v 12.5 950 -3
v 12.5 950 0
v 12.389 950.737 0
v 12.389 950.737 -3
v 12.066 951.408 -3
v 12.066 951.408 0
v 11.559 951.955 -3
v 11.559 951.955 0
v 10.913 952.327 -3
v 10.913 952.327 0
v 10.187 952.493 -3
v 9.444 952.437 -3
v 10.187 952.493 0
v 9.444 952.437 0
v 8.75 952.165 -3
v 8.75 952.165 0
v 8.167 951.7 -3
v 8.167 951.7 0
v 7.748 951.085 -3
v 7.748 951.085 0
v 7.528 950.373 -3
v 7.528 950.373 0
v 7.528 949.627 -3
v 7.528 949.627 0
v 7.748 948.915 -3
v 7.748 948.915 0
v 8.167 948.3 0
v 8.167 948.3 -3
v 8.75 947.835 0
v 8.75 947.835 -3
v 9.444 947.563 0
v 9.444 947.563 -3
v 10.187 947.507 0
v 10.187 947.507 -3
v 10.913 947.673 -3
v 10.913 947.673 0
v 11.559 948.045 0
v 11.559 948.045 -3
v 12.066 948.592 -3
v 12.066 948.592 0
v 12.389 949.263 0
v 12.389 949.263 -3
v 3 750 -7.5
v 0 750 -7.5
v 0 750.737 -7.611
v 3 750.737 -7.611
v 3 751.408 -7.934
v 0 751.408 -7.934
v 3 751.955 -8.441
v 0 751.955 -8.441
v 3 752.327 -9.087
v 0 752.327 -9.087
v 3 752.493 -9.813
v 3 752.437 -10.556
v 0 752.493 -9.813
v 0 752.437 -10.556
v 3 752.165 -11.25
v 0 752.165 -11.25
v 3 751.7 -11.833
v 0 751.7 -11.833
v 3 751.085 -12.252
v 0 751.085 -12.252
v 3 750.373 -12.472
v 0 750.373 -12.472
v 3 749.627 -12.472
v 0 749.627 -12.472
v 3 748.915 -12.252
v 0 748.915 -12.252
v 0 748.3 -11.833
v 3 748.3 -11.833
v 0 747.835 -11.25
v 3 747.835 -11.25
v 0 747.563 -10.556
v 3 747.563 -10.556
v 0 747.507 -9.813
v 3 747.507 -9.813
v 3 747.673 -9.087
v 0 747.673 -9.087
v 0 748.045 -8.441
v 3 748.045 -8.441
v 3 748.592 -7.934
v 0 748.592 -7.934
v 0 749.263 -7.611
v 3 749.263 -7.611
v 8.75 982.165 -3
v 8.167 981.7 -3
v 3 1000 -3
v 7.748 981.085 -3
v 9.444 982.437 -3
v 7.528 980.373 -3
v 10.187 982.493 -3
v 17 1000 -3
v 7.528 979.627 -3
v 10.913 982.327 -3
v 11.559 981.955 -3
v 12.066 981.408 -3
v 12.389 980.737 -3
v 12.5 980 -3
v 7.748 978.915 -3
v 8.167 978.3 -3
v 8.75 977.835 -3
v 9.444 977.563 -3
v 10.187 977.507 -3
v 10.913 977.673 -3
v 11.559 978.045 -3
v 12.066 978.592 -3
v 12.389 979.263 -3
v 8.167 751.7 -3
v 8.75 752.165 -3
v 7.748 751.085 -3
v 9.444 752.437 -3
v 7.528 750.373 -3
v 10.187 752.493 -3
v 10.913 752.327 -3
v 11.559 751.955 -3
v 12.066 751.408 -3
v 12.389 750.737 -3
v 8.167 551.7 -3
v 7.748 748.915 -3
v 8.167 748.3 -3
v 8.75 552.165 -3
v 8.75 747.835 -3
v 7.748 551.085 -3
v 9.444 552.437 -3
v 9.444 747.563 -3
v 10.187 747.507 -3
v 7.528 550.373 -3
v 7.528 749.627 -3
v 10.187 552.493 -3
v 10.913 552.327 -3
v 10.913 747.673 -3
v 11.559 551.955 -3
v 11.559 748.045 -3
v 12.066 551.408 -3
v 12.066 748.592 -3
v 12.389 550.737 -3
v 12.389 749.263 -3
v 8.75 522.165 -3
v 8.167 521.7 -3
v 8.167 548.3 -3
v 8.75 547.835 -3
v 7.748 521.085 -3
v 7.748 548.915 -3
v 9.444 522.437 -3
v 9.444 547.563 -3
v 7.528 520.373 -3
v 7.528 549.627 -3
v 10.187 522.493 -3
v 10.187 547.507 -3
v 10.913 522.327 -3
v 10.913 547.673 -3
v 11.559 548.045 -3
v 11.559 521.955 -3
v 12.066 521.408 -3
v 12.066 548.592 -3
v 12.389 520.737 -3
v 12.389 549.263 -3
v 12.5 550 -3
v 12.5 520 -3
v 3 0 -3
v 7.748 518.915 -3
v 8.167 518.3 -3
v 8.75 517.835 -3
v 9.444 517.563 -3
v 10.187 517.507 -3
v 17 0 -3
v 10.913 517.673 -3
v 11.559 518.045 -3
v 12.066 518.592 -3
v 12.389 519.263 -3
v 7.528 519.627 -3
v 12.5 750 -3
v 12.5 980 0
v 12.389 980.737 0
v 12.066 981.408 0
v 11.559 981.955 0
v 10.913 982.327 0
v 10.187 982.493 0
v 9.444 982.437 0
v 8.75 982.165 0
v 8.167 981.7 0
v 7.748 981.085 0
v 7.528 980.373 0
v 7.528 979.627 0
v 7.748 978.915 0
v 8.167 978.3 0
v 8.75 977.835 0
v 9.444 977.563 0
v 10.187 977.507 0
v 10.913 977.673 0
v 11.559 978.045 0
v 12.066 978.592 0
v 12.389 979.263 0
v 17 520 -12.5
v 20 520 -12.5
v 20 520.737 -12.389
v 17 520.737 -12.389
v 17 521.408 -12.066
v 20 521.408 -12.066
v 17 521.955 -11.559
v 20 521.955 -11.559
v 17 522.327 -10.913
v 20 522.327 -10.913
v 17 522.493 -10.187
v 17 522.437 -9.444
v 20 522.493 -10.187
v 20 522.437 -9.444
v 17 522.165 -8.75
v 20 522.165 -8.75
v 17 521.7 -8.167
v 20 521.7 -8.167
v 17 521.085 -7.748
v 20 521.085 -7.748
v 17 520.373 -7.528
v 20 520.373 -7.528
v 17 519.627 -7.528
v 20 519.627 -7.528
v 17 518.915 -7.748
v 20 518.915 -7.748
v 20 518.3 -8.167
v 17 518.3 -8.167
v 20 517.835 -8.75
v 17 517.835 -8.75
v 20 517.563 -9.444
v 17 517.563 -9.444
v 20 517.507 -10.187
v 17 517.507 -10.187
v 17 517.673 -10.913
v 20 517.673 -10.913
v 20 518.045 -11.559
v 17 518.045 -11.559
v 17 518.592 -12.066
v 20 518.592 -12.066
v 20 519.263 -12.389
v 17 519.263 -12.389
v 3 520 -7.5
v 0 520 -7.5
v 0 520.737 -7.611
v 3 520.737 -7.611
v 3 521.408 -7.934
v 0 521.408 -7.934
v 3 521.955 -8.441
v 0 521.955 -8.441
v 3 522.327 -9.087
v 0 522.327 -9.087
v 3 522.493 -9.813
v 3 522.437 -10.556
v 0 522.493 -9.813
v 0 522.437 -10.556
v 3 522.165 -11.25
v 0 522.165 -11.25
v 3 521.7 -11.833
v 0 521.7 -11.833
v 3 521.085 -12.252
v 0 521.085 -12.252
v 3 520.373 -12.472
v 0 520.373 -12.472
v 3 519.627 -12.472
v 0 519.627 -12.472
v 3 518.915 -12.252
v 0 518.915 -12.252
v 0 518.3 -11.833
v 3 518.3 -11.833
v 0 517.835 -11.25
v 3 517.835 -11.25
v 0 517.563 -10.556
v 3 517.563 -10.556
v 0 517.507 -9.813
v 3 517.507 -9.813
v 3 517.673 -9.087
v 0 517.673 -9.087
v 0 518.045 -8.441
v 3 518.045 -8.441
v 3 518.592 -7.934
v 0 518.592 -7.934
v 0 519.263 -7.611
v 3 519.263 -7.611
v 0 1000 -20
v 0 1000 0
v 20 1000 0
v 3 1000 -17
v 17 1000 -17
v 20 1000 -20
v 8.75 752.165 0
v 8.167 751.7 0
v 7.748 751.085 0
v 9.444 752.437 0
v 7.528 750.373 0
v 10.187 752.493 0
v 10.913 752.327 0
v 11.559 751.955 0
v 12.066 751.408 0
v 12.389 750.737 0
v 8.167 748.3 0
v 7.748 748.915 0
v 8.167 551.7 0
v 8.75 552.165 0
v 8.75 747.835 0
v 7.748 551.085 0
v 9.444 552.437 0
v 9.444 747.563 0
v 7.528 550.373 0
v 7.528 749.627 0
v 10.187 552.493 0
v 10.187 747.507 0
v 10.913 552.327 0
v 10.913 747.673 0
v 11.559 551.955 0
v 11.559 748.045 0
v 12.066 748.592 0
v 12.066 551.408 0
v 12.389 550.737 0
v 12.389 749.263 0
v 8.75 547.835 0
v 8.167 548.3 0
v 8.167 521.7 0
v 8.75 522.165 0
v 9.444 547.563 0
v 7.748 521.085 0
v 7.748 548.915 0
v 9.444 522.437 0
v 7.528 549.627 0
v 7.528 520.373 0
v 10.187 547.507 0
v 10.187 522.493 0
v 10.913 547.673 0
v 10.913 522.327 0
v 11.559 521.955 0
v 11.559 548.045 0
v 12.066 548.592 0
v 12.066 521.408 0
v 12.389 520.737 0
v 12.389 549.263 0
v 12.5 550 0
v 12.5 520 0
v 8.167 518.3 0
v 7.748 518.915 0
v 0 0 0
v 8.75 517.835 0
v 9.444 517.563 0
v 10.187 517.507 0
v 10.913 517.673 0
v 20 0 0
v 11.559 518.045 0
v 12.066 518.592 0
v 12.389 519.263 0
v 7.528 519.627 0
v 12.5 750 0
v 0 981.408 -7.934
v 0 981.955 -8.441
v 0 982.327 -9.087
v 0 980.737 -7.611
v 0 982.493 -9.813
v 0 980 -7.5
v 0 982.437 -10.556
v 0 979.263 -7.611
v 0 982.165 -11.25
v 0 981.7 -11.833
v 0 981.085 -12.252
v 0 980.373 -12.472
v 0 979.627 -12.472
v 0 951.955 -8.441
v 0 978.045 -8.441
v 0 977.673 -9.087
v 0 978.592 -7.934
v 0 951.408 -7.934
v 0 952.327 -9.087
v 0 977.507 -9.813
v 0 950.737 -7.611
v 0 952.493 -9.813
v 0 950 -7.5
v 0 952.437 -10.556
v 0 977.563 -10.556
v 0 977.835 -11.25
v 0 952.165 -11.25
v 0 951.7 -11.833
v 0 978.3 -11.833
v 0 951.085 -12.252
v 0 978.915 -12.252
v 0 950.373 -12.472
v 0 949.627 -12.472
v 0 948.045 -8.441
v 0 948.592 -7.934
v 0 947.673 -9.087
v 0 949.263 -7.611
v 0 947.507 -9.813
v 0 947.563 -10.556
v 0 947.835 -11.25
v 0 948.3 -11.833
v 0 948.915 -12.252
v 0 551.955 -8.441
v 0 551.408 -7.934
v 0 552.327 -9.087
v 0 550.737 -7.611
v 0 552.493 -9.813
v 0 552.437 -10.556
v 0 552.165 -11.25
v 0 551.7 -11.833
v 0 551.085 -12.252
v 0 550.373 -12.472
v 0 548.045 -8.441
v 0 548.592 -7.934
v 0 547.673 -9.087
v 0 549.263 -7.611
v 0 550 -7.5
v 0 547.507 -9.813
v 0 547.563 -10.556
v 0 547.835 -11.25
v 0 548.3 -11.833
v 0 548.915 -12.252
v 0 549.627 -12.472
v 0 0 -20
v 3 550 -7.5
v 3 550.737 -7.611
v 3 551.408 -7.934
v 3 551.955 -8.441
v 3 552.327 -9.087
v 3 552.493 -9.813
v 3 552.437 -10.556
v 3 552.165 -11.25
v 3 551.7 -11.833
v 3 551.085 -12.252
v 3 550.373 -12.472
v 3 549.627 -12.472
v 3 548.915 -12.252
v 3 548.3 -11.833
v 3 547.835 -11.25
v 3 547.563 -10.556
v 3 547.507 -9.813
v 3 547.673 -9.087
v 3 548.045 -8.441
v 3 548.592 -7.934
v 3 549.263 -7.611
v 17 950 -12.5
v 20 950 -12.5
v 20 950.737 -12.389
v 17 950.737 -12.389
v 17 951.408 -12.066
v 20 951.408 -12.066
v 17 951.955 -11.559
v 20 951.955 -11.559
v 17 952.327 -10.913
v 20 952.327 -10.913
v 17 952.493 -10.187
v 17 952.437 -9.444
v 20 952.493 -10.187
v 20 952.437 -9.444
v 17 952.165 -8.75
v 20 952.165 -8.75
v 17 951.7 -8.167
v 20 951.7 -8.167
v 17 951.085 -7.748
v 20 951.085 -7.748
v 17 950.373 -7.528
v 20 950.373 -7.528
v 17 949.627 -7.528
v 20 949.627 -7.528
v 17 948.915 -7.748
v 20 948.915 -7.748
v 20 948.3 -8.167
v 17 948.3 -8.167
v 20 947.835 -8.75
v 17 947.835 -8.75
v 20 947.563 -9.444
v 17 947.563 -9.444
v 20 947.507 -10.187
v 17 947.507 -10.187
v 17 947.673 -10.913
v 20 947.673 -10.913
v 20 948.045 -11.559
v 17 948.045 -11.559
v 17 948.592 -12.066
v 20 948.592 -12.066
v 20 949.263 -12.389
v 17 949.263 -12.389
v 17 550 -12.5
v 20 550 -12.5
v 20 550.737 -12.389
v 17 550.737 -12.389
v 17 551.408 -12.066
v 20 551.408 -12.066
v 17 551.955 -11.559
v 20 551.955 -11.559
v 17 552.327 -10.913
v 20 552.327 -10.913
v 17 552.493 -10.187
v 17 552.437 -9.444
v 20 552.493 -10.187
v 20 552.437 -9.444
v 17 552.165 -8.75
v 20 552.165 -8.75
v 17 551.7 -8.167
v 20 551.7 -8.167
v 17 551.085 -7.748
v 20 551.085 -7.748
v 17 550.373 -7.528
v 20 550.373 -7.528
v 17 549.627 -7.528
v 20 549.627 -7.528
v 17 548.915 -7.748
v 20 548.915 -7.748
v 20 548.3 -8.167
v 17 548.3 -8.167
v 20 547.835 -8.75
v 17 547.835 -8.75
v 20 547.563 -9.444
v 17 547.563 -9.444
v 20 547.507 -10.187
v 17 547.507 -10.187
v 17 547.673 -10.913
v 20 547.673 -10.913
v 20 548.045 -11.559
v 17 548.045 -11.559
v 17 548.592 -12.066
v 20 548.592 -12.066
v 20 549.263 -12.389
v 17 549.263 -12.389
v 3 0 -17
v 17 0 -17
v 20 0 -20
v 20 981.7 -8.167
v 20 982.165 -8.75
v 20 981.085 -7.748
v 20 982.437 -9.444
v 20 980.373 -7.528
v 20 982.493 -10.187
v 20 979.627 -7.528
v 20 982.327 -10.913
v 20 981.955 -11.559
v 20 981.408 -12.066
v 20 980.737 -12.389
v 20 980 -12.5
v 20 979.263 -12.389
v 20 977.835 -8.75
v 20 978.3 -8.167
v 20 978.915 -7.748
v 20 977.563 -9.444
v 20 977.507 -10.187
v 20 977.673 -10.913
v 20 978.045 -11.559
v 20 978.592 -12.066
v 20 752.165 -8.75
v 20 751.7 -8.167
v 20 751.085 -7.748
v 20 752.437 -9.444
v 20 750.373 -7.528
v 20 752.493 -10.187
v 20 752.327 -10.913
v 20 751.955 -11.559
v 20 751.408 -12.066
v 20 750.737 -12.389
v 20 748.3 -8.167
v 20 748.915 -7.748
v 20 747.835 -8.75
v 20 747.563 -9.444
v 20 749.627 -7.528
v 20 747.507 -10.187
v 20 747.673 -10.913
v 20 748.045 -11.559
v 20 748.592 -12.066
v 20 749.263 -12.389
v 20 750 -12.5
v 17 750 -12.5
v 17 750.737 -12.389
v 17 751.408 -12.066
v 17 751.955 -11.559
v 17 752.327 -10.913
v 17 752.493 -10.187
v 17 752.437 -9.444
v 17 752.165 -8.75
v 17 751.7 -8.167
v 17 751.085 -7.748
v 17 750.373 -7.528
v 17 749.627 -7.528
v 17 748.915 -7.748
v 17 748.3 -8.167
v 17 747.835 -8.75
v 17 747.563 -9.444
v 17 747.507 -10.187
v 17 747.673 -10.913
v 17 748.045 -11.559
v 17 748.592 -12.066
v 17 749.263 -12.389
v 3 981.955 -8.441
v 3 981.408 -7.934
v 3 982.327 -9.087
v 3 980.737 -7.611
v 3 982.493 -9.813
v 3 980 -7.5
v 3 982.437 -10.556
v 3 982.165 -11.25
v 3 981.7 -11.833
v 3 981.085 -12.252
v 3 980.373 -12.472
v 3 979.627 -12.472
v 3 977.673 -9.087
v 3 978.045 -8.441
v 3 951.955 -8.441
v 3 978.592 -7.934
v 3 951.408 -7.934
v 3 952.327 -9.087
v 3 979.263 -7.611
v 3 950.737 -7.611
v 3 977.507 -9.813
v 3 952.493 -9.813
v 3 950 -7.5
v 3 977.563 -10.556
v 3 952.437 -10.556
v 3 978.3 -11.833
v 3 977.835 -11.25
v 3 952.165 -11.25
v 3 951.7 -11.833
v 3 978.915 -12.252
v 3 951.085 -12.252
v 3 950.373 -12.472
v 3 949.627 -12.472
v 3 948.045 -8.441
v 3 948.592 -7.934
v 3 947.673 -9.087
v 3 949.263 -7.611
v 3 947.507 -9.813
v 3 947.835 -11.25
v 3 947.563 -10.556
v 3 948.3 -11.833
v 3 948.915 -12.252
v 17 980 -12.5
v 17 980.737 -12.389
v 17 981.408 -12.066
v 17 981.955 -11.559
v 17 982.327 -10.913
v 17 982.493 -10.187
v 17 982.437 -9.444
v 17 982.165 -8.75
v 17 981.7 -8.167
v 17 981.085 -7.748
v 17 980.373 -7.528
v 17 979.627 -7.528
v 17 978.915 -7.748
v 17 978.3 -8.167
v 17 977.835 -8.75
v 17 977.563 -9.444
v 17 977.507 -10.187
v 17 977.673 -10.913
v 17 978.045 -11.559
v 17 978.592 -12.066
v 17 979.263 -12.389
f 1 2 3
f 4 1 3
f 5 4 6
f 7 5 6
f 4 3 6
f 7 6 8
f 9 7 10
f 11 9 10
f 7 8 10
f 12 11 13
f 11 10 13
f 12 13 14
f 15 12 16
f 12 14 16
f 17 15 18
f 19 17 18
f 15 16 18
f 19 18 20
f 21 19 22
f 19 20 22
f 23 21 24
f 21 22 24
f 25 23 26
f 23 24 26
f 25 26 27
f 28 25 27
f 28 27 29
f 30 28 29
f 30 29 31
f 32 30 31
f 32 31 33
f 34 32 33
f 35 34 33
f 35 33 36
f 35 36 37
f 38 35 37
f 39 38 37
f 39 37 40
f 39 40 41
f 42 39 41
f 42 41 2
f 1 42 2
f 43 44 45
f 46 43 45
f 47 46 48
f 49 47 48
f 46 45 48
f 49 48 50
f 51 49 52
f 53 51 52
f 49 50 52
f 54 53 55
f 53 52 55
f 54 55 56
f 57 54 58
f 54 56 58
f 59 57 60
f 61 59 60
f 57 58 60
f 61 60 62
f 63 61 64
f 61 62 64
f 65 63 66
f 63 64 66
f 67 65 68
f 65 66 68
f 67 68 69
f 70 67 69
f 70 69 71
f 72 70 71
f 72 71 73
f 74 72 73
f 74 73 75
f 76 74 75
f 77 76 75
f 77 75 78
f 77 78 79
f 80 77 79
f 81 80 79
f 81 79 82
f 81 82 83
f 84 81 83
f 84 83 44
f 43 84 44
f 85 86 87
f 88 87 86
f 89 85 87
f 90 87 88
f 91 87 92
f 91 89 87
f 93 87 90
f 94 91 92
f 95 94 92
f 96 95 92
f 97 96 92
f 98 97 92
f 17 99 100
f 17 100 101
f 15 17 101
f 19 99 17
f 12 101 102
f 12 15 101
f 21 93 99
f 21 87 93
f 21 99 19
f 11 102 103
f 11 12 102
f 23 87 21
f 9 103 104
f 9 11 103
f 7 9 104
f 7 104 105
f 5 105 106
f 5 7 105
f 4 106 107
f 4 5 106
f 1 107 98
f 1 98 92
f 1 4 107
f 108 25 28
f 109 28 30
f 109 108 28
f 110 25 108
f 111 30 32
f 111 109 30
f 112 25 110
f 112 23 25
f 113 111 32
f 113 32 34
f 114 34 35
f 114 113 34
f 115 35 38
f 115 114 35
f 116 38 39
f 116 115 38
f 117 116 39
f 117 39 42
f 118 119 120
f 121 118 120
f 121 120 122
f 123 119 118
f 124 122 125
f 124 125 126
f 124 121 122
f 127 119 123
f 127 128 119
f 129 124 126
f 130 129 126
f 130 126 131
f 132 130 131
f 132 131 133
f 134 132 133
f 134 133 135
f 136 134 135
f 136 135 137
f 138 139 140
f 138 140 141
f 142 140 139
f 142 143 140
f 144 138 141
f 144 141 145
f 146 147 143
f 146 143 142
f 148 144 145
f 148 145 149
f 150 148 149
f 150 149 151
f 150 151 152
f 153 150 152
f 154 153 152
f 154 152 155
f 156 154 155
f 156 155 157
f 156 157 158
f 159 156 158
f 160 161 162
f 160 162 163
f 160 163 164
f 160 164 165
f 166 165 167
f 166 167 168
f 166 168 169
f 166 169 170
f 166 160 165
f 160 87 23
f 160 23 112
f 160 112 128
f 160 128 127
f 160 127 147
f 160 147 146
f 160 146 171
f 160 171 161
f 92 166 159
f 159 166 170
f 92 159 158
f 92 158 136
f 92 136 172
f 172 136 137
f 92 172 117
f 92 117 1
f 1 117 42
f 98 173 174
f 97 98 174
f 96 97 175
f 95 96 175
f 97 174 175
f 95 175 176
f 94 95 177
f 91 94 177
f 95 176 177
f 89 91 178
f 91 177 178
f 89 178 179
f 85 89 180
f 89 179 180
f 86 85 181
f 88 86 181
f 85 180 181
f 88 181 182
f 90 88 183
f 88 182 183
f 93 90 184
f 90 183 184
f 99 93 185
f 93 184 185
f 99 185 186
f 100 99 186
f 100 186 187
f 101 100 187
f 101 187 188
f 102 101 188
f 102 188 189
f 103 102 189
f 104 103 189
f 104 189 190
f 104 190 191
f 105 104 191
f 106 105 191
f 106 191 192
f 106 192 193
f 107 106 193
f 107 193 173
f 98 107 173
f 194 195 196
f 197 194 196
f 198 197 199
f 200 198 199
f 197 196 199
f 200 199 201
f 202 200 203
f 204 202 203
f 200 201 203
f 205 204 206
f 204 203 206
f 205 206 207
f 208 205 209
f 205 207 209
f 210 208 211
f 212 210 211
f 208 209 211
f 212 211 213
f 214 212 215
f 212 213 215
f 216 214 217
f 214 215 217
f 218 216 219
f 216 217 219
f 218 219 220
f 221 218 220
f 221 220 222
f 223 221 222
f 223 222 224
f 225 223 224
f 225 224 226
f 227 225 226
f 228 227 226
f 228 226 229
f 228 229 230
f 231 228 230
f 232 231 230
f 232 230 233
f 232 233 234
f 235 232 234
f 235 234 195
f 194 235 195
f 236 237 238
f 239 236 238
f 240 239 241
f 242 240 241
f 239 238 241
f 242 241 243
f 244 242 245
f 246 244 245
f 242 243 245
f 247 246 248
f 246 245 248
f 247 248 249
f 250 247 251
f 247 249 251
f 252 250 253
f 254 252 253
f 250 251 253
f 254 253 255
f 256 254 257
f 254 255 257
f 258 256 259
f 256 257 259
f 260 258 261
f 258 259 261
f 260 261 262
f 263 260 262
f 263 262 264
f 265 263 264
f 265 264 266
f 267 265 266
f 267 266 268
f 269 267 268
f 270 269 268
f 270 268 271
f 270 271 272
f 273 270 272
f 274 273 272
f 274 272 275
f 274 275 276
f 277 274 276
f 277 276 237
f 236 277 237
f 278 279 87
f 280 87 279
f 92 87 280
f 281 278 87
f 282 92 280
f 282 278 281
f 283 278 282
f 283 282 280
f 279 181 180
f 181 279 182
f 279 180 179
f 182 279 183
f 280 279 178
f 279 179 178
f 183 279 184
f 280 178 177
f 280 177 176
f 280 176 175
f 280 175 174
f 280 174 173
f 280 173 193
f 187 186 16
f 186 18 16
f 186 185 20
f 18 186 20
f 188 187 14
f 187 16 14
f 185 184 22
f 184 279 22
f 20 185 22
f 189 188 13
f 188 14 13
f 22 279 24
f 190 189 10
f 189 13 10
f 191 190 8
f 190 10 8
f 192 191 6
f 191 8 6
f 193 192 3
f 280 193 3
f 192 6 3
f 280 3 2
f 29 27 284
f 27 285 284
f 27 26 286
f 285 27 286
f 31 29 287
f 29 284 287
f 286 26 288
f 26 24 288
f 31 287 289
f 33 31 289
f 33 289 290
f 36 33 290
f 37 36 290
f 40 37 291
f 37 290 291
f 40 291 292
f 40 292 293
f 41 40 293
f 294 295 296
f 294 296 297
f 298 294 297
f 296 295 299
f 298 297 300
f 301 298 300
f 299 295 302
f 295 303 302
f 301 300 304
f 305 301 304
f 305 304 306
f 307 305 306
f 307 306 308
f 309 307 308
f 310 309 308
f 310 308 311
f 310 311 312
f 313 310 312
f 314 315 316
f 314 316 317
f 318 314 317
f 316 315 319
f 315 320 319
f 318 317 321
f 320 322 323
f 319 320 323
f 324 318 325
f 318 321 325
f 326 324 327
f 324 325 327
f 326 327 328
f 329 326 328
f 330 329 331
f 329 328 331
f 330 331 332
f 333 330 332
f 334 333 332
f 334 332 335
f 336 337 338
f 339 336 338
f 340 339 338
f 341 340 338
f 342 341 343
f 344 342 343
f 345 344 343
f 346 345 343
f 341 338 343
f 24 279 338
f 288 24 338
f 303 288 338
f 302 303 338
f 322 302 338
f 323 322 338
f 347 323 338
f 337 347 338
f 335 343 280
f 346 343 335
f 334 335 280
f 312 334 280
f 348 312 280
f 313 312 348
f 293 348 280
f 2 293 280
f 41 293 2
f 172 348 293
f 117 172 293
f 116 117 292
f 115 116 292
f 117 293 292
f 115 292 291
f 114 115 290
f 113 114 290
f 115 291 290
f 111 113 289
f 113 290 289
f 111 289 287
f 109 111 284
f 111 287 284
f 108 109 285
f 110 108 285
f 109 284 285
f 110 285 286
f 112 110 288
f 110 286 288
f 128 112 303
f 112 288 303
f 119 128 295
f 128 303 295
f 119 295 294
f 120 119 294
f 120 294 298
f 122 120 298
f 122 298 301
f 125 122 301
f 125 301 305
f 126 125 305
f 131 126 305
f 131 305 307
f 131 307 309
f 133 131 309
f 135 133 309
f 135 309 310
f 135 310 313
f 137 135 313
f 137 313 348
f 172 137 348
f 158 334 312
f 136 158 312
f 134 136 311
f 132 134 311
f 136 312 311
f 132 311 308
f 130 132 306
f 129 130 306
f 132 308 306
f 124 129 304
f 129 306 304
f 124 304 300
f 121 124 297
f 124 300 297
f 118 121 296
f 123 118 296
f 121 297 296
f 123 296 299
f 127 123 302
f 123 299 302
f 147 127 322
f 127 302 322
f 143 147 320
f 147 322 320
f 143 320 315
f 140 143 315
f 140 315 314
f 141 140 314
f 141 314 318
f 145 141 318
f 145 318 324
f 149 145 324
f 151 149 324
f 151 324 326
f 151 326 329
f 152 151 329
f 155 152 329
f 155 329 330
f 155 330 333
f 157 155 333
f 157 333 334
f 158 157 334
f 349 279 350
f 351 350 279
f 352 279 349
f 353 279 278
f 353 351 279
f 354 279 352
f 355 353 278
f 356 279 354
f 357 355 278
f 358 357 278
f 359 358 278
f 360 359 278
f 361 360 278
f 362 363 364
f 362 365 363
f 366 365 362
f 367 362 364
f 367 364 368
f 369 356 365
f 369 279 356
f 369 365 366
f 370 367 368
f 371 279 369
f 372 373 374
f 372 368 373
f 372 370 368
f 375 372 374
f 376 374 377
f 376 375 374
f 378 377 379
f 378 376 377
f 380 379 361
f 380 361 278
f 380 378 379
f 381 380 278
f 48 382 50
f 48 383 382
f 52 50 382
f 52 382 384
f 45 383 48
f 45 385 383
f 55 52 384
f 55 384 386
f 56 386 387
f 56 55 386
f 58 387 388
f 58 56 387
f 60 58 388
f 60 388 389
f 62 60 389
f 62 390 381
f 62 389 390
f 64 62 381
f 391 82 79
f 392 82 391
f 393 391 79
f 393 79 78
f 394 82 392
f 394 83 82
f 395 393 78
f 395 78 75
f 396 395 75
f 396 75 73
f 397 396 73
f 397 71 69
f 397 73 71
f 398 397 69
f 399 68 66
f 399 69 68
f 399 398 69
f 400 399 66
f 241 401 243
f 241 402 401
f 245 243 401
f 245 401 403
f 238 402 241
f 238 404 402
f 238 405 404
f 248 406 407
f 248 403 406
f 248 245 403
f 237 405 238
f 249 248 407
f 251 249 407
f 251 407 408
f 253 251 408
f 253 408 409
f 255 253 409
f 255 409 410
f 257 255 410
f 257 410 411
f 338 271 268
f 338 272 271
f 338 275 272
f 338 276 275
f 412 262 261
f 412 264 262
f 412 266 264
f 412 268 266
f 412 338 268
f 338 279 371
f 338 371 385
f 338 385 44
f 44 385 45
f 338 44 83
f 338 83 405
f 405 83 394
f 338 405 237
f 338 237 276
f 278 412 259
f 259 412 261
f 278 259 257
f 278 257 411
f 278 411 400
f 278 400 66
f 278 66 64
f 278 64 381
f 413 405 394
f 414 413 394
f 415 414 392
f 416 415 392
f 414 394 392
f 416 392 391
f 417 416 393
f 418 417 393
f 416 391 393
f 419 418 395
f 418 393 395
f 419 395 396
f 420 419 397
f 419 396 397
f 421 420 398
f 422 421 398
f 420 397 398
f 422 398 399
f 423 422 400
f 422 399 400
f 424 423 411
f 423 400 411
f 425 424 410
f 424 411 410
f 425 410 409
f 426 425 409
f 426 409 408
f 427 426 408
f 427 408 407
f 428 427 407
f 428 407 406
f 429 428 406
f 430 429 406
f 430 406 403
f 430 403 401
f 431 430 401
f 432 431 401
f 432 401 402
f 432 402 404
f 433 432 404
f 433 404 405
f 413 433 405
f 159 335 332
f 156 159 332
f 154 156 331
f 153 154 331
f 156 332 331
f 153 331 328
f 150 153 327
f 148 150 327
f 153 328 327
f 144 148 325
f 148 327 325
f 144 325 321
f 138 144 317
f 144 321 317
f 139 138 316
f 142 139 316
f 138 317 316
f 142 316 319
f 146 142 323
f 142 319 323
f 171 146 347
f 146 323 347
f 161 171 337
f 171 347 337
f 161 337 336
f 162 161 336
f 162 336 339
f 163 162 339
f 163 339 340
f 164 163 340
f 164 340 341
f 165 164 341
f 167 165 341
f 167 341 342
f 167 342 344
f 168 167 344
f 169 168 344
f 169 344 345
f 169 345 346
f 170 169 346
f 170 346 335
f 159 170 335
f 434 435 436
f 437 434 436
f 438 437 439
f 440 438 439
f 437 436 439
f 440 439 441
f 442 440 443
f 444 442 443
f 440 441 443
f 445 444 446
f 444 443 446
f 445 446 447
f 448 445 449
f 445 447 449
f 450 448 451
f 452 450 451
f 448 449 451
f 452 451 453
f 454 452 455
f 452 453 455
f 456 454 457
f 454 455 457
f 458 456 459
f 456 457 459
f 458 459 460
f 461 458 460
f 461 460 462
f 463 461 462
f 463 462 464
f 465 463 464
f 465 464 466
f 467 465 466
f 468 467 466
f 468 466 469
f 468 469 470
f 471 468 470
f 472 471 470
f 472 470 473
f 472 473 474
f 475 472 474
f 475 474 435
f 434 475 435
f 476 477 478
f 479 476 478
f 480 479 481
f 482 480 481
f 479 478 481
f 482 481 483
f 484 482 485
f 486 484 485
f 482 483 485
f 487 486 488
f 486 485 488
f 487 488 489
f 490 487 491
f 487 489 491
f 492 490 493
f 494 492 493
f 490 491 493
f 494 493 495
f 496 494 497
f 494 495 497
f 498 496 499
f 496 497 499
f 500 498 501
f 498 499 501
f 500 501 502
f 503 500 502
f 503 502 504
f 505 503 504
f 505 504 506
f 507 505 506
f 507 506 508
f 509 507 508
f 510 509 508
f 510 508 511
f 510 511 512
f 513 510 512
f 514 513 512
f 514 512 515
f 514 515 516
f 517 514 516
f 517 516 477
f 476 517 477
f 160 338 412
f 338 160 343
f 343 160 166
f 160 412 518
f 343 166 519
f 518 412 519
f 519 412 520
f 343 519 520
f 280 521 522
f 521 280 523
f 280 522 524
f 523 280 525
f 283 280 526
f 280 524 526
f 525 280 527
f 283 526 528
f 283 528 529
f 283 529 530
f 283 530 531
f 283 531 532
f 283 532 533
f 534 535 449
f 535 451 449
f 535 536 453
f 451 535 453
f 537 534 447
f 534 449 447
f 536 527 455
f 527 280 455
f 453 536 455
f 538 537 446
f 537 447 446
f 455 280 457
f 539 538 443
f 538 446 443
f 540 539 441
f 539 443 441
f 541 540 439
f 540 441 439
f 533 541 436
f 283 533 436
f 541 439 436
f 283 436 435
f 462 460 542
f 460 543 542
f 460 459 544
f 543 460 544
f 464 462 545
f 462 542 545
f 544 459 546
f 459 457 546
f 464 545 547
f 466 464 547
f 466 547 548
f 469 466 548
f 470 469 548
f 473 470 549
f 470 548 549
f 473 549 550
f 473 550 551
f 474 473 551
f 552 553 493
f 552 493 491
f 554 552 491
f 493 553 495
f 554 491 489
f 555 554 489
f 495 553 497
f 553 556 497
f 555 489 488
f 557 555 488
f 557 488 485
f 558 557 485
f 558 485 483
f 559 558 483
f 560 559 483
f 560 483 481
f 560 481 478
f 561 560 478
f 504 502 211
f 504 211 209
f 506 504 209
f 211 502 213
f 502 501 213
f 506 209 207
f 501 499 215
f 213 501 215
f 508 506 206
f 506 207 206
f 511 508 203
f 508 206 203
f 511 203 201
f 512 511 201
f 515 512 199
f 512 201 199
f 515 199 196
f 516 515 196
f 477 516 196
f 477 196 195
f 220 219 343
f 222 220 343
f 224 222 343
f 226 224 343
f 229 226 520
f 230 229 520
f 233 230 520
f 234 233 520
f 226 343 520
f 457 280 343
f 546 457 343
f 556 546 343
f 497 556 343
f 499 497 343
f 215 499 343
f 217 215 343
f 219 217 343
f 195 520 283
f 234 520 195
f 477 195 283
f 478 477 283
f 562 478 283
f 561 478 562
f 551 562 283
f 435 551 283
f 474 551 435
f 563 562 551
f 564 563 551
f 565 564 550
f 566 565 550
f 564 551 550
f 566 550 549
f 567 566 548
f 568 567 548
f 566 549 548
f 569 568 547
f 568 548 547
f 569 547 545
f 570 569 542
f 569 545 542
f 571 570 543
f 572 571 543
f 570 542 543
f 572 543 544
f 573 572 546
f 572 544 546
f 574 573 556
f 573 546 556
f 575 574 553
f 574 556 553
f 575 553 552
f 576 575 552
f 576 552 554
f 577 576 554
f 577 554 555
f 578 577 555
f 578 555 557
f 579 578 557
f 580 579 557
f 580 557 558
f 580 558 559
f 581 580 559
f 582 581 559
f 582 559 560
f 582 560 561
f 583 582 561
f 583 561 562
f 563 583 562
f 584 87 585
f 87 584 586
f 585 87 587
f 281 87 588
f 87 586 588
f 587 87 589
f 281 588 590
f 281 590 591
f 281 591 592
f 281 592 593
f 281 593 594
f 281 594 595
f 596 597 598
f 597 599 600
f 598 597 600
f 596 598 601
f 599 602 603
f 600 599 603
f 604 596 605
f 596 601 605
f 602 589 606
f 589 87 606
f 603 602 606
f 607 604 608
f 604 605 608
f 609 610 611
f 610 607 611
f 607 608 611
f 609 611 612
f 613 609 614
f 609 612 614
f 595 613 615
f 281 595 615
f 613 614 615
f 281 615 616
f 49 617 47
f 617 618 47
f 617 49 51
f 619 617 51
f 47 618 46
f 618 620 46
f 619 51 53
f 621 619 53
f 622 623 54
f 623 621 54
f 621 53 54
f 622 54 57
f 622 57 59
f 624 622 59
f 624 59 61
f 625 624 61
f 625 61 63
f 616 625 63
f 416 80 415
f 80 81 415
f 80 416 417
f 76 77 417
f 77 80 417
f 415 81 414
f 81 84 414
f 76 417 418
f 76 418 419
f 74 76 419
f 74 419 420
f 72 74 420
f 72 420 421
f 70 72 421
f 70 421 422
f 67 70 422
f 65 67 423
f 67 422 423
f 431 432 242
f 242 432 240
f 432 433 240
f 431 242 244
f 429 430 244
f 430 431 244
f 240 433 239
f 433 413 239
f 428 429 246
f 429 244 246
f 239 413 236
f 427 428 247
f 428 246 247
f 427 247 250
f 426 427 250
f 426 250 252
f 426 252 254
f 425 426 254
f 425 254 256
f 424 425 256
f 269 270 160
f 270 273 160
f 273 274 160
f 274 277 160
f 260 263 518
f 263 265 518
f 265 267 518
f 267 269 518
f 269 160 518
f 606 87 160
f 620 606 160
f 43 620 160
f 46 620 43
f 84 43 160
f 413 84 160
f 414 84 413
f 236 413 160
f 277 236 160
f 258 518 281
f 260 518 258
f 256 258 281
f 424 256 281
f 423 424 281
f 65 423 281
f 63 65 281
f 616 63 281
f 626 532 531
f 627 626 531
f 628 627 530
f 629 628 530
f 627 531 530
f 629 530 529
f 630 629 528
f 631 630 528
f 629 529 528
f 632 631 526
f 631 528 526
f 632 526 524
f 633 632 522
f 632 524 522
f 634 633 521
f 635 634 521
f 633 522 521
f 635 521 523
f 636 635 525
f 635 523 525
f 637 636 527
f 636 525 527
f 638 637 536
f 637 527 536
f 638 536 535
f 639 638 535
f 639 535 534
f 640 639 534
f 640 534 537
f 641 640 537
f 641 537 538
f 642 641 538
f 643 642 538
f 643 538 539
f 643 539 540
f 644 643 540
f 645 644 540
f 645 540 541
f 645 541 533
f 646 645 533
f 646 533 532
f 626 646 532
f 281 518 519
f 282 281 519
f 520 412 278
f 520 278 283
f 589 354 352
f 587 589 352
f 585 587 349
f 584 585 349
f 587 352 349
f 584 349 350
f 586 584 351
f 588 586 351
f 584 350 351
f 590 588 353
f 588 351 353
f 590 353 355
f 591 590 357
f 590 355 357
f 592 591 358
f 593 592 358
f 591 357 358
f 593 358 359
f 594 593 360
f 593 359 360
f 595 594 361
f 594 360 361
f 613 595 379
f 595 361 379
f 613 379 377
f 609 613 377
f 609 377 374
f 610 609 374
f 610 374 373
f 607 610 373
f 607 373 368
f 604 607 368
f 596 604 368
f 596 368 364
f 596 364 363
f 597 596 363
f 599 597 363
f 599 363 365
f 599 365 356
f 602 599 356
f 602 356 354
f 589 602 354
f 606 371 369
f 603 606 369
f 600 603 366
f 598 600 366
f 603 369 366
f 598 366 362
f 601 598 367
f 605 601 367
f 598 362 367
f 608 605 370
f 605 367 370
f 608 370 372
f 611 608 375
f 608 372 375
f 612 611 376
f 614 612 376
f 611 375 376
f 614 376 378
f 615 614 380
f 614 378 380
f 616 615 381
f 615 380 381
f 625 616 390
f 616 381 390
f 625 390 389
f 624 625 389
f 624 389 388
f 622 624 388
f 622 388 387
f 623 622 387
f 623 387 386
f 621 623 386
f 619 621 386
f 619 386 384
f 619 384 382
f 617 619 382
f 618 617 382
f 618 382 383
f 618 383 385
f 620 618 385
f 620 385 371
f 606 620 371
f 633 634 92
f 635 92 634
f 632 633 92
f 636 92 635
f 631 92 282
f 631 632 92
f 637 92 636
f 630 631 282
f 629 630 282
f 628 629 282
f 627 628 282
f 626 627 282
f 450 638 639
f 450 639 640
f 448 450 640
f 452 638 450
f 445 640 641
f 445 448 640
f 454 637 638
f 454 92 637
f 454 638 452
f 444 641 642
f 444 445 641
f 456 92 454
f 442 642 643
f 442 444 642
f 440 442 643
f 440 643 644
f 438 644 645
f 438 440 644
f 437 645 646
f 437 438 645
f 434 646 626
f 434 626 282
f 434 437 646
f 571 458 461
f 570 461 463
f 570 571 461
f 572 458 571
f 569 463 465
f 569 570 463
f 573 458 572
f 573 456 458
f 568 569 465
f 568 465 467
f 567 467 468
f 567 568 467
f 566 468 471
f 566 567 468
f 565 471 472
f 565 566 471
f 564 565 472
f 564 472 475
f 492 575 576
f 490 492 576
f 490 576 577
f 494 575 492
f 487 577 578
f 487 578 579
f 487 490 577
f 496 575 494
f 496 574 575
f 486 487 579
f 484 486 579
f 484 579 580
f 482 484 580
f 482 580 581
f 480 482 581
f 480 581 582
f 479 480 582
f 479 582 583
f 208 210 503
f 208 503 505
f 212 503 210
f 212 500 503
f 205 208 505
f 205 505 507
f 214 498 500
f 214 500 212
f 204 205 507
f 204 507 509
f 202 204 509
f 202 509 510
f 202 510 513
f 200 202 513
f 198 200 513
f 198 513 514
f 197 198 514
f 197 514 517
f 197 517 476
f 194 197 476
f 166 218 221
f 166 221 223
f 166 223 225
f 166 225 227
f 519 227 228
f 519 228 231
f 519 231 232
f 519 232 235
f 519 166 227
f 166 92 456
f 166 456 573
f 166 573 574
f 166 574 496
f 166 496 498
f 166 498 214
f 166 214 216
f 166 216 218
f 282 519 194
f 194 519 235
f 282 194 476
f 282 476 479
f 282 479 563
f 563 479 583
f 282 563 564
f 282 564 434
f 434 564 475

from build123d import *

# Parameters (mm, degrees)
SKETCH1_W                   = 20
SKETCH1_H                   = 20
SKETCH1_W_2                 = 14
SKETCH1_H_2                 = 14
BOSS_EXTRUDE1_DEPTH         = 1000
SKETCH3_R                   = 2.5
CUT_EXTRUDE1_DEPTH          = 10
LPATTERN1_COUNT             = 3
LPATTERN1_PITCH             = 230
CIRPATTERN1_COPY_1_SKETCH_R = 2.5
CIRPATTERN1_COPY_1_DEPTH    = 10
CIRPATTERN1_COPY_2_SKETCH_R = 2.5
CIRPATTERN1_COPY_2_DEPTH    = 10
CIRPATTERN1_COPY_3_SKETCH_R = 2.5
CIRPATTERN1_COPY_3_DEPTH    = 10
CIRPATTERN1_COPY_4_SKETCH_R = 2.5
CIRPATTERN1_COPY_4_DEPTH    = 10
CIRPATTERN1_COPY_5_SKETCH_R = 2.5
CIRPATTERN1_COPY_5_DEPTH    = 10
CIRPATTERN1_COPY_6_SKETCH_R = 2.5
CIRPATTERN1_COPY_6_DEPTH    = 10
SKETCH6_R                   = 2.5
CUT_EXTRUDE2_DEPTH          = 10
LPATTERN2_COUNT             = 2
LPATTERN2_PITCH             = 400
CIRPATTERN2_COPY_1_SKETCH_R = 2.5
CIRPATTERN2_COPY_1_DEPTH    = 10
CIRPATTERN2_COPY_2_SKETCH_R = 2.5
CIRPATTERN2_COPY_2_DEPTH    = 10
CIRPATTERN2_COPY_3_SKETCH_R = 2.5
CIRPATTERN2_COPY_3_DEPTH    = 10
CIRPATTERN2_COPY_4_SKETCH_R = 2.5
CIRPATTERN2_COPY_4_DEPTH    = 10


with BuildPart() as part:
    # Sketch1 → Boss-Extrude1 (new body)
    with BuildSketch(Plane(origin=(0, 0, 0), x_dir=(1, 0, 0), z_dir=(0, 1, 0))):
        with Locations((10, 10)):
            Rectangle(SKETCH1_W, SKETCH1_H)
        with Locations((10, 10)):
            Rectangle(SKETCH1_W_2, SKETCH1_H_2, mode=Mode.SUBTRACT)
    extrude(amount=BOSS_EXTRUDE1_DEPTH)

    # Sketch3 → Cut-Extrude1 (cut)
    with BuildSketch(Plane(origin=(20, 0, 0), x_dir=(0, 0, -1), z_dir=(1, 0, 0))):
        with Locations((10, 980)):
            Circle(SKETCH3_R)
    cut_extrude1 = extrude(amount=-CUT_EXTRUDE1_DEPTH, mode=Mode.SUBTRACT)

    # LPattern1: Cut-Extrude1 ×3
    with Locations(*[(0, -i * LPATTERN1_PITCH, 0) for i in range(1, LPATTERN1_COUNT)]):
        add(cut_extrude1, mode=Mode.SUBTRACT)

    # CirPattern1 copy 1 sketch → CirPattern1 copy 1 (cut)
    with BuildSketch(Plane(origin=(0, -230, 0), x_dir=(1, 0, 0), z_dir=(0, 0, 1))):
        with Locations((10, 980)):
            Circle(CIRPATTERN1_COPY_1_SKETCH_R)
    extrude(amount=-CIRPATTERN1_COPY_1_DEPTH, mode=Mode.SUBTRACT)

    # CirPattern1 copy 2 sketch → CirPattern1 copy 2 (cut)
    with BuildSketch(Plane(origin=(0, -230, -20), x_dir=(0, 0, 1), z_dir=(-1, 0, 0))):
        with Locations((10, 980)):
            Circle(CIRPATTERN1_COPY_2_SKETCH_R)
    extrude(amount=-CIRPATTERN1_COPY_2_DEPTH, mode=Mode.SUBTRACT)

    # CirPattern1 copy 3 sketch → CirPattern1 copy 3 (cut)
    with BuildSketch(Plane(origin=(0, -460, 0), x_dir=(1, 0, 0), z_dir=(0, 0, 1))):
        with Locations((10, 980)):
            Circle(CIRPATTERN1_COPY_3_SKETCH_R)
    extrude(amount=-CIRPATTERN1_COPY_3_DEPTH, mode=Mode.SUBTRACT)

    # CirPattern1 copy 4 sketch → CirPattern1 copy 4 (cut)
    with BuildSketch(Plane(origin=(0, -460, -20), x_dir=(0, 0, 1), z_dir=(-1, 0, 0))):
        with Locations((10, 980)):
            Circle(CIRPATTERN1_COPY_4_SKETCH_R)
    extrude(amount=-CIRPATTERN1_COPY_4_DEPTH, mode=Mode.SUBTRACT)

    # CirPattern1 copy 5 sketch → CirPattern1 copy 5 (cut)
    with BuildSketch(Plane.XY):
        with Locations((10, 980)):
            Circle(CIRPATTERN1_COPY_5_SKETCH_R)
    extrude(amount=-CIRPATTERN1_COPY_5_DEPTH, mode=Mode.SUBTRACT)

    # CirPattern1 copy 6 sketch → CirPattern1 copy 6 (cut)
    with BuildSketch(Plane(origin=(0, 0, -20), x_dir=(0, 0, 1), z_dir=(-1, 0, 0))):
        with Locations((10, 980)):
            Circle(CIRPATTERN1_COPY_6_SKETCH_R)
    extrude(amount=-CIRPATTERN1_COPY_6_DEPTH, mode=Mode.SUBTRACT)

    # Sketch6 → Cut-Extrude2 (cut)
    with BuildSketch(Plane(origin=(20, 0, 0), x_dir=(0, 0, -1), z_dir=(1, 0, 0))):
        with Locations((10, 950)):
            Circle(SKETCH6_R)
    cut_extrude2 = extrude(amount=-CUT_EXTRUDE2_DEPTH, mode=Mode.SUBTRACT)

    # LPattern2: Cut-Extrude2 ×2
    with Locations(*[(0, -i * LPATTERN2_PITCH, 0) for i in range(1, LPATTERN2_COUNT)]):
        add(cut_extrude2, mode=Mode.SUBTRACT)

    # CirPattern2 copy 1 sketch → CirPattern2 copy 1 (cut)
    with BuildSketch(Plane(origin=(0, -400, 0), x_dir=(1, 0, 0), z_dir=(0, 0, 1))):
        with Locations((10, 950)):
            Circle(CIRPATTERN2_COPY_1_SKETCH_R)
    extrude(amount=-CIRPATTERN2_COPY_1_DEPTH, mode=Mode.SUBTRACT)

    # CirPattern2 copy 2 sketch → CirPattern2 copy 2 (cut)
    with BuildSketch(Plane(origin=(0, -400, -20), x_dir=(0, 0, 1), z_dir=(-1, 0, 0))):
        with Locations((10, 950)):
            Circle(CIRPATTERN2_COPY_2_SKETCH_R)
    extrude(amount=-CIRPATTERN2_COPY_2_DEPTH, mode=Mode.SUBTRACT)

    # CirPattern2 copy 3 sketch → CirPattern2 copy 3 (cut)
    with BuildSketch(Plane.XY):
        with Locations((10, 950)):
            Circle(CIRPATTERN2_COPY_3_SKETCH_R)
    extrude(amount=-CIRPATTERN2_COPY_3_DEPTH, mode=Mode.SUBTRACT)

    # CirPattern2 copy 4 sketch → CirPattern2 copy 4 (cut)
    with BuildSketch(Plane(origin=(0, 0, -20), x_dir=(0, 0, 1), z_dir=(-1, 0, 0))):
        with Locations((10, 950)):
            Circle(CIRPATTERN2_COPY_4_SKETCH_R)
    extrude(amount=-CIRPATTERN2_COPY_4_DEPTH, mode=Mode.SUBTRACT)


solid = part.part
